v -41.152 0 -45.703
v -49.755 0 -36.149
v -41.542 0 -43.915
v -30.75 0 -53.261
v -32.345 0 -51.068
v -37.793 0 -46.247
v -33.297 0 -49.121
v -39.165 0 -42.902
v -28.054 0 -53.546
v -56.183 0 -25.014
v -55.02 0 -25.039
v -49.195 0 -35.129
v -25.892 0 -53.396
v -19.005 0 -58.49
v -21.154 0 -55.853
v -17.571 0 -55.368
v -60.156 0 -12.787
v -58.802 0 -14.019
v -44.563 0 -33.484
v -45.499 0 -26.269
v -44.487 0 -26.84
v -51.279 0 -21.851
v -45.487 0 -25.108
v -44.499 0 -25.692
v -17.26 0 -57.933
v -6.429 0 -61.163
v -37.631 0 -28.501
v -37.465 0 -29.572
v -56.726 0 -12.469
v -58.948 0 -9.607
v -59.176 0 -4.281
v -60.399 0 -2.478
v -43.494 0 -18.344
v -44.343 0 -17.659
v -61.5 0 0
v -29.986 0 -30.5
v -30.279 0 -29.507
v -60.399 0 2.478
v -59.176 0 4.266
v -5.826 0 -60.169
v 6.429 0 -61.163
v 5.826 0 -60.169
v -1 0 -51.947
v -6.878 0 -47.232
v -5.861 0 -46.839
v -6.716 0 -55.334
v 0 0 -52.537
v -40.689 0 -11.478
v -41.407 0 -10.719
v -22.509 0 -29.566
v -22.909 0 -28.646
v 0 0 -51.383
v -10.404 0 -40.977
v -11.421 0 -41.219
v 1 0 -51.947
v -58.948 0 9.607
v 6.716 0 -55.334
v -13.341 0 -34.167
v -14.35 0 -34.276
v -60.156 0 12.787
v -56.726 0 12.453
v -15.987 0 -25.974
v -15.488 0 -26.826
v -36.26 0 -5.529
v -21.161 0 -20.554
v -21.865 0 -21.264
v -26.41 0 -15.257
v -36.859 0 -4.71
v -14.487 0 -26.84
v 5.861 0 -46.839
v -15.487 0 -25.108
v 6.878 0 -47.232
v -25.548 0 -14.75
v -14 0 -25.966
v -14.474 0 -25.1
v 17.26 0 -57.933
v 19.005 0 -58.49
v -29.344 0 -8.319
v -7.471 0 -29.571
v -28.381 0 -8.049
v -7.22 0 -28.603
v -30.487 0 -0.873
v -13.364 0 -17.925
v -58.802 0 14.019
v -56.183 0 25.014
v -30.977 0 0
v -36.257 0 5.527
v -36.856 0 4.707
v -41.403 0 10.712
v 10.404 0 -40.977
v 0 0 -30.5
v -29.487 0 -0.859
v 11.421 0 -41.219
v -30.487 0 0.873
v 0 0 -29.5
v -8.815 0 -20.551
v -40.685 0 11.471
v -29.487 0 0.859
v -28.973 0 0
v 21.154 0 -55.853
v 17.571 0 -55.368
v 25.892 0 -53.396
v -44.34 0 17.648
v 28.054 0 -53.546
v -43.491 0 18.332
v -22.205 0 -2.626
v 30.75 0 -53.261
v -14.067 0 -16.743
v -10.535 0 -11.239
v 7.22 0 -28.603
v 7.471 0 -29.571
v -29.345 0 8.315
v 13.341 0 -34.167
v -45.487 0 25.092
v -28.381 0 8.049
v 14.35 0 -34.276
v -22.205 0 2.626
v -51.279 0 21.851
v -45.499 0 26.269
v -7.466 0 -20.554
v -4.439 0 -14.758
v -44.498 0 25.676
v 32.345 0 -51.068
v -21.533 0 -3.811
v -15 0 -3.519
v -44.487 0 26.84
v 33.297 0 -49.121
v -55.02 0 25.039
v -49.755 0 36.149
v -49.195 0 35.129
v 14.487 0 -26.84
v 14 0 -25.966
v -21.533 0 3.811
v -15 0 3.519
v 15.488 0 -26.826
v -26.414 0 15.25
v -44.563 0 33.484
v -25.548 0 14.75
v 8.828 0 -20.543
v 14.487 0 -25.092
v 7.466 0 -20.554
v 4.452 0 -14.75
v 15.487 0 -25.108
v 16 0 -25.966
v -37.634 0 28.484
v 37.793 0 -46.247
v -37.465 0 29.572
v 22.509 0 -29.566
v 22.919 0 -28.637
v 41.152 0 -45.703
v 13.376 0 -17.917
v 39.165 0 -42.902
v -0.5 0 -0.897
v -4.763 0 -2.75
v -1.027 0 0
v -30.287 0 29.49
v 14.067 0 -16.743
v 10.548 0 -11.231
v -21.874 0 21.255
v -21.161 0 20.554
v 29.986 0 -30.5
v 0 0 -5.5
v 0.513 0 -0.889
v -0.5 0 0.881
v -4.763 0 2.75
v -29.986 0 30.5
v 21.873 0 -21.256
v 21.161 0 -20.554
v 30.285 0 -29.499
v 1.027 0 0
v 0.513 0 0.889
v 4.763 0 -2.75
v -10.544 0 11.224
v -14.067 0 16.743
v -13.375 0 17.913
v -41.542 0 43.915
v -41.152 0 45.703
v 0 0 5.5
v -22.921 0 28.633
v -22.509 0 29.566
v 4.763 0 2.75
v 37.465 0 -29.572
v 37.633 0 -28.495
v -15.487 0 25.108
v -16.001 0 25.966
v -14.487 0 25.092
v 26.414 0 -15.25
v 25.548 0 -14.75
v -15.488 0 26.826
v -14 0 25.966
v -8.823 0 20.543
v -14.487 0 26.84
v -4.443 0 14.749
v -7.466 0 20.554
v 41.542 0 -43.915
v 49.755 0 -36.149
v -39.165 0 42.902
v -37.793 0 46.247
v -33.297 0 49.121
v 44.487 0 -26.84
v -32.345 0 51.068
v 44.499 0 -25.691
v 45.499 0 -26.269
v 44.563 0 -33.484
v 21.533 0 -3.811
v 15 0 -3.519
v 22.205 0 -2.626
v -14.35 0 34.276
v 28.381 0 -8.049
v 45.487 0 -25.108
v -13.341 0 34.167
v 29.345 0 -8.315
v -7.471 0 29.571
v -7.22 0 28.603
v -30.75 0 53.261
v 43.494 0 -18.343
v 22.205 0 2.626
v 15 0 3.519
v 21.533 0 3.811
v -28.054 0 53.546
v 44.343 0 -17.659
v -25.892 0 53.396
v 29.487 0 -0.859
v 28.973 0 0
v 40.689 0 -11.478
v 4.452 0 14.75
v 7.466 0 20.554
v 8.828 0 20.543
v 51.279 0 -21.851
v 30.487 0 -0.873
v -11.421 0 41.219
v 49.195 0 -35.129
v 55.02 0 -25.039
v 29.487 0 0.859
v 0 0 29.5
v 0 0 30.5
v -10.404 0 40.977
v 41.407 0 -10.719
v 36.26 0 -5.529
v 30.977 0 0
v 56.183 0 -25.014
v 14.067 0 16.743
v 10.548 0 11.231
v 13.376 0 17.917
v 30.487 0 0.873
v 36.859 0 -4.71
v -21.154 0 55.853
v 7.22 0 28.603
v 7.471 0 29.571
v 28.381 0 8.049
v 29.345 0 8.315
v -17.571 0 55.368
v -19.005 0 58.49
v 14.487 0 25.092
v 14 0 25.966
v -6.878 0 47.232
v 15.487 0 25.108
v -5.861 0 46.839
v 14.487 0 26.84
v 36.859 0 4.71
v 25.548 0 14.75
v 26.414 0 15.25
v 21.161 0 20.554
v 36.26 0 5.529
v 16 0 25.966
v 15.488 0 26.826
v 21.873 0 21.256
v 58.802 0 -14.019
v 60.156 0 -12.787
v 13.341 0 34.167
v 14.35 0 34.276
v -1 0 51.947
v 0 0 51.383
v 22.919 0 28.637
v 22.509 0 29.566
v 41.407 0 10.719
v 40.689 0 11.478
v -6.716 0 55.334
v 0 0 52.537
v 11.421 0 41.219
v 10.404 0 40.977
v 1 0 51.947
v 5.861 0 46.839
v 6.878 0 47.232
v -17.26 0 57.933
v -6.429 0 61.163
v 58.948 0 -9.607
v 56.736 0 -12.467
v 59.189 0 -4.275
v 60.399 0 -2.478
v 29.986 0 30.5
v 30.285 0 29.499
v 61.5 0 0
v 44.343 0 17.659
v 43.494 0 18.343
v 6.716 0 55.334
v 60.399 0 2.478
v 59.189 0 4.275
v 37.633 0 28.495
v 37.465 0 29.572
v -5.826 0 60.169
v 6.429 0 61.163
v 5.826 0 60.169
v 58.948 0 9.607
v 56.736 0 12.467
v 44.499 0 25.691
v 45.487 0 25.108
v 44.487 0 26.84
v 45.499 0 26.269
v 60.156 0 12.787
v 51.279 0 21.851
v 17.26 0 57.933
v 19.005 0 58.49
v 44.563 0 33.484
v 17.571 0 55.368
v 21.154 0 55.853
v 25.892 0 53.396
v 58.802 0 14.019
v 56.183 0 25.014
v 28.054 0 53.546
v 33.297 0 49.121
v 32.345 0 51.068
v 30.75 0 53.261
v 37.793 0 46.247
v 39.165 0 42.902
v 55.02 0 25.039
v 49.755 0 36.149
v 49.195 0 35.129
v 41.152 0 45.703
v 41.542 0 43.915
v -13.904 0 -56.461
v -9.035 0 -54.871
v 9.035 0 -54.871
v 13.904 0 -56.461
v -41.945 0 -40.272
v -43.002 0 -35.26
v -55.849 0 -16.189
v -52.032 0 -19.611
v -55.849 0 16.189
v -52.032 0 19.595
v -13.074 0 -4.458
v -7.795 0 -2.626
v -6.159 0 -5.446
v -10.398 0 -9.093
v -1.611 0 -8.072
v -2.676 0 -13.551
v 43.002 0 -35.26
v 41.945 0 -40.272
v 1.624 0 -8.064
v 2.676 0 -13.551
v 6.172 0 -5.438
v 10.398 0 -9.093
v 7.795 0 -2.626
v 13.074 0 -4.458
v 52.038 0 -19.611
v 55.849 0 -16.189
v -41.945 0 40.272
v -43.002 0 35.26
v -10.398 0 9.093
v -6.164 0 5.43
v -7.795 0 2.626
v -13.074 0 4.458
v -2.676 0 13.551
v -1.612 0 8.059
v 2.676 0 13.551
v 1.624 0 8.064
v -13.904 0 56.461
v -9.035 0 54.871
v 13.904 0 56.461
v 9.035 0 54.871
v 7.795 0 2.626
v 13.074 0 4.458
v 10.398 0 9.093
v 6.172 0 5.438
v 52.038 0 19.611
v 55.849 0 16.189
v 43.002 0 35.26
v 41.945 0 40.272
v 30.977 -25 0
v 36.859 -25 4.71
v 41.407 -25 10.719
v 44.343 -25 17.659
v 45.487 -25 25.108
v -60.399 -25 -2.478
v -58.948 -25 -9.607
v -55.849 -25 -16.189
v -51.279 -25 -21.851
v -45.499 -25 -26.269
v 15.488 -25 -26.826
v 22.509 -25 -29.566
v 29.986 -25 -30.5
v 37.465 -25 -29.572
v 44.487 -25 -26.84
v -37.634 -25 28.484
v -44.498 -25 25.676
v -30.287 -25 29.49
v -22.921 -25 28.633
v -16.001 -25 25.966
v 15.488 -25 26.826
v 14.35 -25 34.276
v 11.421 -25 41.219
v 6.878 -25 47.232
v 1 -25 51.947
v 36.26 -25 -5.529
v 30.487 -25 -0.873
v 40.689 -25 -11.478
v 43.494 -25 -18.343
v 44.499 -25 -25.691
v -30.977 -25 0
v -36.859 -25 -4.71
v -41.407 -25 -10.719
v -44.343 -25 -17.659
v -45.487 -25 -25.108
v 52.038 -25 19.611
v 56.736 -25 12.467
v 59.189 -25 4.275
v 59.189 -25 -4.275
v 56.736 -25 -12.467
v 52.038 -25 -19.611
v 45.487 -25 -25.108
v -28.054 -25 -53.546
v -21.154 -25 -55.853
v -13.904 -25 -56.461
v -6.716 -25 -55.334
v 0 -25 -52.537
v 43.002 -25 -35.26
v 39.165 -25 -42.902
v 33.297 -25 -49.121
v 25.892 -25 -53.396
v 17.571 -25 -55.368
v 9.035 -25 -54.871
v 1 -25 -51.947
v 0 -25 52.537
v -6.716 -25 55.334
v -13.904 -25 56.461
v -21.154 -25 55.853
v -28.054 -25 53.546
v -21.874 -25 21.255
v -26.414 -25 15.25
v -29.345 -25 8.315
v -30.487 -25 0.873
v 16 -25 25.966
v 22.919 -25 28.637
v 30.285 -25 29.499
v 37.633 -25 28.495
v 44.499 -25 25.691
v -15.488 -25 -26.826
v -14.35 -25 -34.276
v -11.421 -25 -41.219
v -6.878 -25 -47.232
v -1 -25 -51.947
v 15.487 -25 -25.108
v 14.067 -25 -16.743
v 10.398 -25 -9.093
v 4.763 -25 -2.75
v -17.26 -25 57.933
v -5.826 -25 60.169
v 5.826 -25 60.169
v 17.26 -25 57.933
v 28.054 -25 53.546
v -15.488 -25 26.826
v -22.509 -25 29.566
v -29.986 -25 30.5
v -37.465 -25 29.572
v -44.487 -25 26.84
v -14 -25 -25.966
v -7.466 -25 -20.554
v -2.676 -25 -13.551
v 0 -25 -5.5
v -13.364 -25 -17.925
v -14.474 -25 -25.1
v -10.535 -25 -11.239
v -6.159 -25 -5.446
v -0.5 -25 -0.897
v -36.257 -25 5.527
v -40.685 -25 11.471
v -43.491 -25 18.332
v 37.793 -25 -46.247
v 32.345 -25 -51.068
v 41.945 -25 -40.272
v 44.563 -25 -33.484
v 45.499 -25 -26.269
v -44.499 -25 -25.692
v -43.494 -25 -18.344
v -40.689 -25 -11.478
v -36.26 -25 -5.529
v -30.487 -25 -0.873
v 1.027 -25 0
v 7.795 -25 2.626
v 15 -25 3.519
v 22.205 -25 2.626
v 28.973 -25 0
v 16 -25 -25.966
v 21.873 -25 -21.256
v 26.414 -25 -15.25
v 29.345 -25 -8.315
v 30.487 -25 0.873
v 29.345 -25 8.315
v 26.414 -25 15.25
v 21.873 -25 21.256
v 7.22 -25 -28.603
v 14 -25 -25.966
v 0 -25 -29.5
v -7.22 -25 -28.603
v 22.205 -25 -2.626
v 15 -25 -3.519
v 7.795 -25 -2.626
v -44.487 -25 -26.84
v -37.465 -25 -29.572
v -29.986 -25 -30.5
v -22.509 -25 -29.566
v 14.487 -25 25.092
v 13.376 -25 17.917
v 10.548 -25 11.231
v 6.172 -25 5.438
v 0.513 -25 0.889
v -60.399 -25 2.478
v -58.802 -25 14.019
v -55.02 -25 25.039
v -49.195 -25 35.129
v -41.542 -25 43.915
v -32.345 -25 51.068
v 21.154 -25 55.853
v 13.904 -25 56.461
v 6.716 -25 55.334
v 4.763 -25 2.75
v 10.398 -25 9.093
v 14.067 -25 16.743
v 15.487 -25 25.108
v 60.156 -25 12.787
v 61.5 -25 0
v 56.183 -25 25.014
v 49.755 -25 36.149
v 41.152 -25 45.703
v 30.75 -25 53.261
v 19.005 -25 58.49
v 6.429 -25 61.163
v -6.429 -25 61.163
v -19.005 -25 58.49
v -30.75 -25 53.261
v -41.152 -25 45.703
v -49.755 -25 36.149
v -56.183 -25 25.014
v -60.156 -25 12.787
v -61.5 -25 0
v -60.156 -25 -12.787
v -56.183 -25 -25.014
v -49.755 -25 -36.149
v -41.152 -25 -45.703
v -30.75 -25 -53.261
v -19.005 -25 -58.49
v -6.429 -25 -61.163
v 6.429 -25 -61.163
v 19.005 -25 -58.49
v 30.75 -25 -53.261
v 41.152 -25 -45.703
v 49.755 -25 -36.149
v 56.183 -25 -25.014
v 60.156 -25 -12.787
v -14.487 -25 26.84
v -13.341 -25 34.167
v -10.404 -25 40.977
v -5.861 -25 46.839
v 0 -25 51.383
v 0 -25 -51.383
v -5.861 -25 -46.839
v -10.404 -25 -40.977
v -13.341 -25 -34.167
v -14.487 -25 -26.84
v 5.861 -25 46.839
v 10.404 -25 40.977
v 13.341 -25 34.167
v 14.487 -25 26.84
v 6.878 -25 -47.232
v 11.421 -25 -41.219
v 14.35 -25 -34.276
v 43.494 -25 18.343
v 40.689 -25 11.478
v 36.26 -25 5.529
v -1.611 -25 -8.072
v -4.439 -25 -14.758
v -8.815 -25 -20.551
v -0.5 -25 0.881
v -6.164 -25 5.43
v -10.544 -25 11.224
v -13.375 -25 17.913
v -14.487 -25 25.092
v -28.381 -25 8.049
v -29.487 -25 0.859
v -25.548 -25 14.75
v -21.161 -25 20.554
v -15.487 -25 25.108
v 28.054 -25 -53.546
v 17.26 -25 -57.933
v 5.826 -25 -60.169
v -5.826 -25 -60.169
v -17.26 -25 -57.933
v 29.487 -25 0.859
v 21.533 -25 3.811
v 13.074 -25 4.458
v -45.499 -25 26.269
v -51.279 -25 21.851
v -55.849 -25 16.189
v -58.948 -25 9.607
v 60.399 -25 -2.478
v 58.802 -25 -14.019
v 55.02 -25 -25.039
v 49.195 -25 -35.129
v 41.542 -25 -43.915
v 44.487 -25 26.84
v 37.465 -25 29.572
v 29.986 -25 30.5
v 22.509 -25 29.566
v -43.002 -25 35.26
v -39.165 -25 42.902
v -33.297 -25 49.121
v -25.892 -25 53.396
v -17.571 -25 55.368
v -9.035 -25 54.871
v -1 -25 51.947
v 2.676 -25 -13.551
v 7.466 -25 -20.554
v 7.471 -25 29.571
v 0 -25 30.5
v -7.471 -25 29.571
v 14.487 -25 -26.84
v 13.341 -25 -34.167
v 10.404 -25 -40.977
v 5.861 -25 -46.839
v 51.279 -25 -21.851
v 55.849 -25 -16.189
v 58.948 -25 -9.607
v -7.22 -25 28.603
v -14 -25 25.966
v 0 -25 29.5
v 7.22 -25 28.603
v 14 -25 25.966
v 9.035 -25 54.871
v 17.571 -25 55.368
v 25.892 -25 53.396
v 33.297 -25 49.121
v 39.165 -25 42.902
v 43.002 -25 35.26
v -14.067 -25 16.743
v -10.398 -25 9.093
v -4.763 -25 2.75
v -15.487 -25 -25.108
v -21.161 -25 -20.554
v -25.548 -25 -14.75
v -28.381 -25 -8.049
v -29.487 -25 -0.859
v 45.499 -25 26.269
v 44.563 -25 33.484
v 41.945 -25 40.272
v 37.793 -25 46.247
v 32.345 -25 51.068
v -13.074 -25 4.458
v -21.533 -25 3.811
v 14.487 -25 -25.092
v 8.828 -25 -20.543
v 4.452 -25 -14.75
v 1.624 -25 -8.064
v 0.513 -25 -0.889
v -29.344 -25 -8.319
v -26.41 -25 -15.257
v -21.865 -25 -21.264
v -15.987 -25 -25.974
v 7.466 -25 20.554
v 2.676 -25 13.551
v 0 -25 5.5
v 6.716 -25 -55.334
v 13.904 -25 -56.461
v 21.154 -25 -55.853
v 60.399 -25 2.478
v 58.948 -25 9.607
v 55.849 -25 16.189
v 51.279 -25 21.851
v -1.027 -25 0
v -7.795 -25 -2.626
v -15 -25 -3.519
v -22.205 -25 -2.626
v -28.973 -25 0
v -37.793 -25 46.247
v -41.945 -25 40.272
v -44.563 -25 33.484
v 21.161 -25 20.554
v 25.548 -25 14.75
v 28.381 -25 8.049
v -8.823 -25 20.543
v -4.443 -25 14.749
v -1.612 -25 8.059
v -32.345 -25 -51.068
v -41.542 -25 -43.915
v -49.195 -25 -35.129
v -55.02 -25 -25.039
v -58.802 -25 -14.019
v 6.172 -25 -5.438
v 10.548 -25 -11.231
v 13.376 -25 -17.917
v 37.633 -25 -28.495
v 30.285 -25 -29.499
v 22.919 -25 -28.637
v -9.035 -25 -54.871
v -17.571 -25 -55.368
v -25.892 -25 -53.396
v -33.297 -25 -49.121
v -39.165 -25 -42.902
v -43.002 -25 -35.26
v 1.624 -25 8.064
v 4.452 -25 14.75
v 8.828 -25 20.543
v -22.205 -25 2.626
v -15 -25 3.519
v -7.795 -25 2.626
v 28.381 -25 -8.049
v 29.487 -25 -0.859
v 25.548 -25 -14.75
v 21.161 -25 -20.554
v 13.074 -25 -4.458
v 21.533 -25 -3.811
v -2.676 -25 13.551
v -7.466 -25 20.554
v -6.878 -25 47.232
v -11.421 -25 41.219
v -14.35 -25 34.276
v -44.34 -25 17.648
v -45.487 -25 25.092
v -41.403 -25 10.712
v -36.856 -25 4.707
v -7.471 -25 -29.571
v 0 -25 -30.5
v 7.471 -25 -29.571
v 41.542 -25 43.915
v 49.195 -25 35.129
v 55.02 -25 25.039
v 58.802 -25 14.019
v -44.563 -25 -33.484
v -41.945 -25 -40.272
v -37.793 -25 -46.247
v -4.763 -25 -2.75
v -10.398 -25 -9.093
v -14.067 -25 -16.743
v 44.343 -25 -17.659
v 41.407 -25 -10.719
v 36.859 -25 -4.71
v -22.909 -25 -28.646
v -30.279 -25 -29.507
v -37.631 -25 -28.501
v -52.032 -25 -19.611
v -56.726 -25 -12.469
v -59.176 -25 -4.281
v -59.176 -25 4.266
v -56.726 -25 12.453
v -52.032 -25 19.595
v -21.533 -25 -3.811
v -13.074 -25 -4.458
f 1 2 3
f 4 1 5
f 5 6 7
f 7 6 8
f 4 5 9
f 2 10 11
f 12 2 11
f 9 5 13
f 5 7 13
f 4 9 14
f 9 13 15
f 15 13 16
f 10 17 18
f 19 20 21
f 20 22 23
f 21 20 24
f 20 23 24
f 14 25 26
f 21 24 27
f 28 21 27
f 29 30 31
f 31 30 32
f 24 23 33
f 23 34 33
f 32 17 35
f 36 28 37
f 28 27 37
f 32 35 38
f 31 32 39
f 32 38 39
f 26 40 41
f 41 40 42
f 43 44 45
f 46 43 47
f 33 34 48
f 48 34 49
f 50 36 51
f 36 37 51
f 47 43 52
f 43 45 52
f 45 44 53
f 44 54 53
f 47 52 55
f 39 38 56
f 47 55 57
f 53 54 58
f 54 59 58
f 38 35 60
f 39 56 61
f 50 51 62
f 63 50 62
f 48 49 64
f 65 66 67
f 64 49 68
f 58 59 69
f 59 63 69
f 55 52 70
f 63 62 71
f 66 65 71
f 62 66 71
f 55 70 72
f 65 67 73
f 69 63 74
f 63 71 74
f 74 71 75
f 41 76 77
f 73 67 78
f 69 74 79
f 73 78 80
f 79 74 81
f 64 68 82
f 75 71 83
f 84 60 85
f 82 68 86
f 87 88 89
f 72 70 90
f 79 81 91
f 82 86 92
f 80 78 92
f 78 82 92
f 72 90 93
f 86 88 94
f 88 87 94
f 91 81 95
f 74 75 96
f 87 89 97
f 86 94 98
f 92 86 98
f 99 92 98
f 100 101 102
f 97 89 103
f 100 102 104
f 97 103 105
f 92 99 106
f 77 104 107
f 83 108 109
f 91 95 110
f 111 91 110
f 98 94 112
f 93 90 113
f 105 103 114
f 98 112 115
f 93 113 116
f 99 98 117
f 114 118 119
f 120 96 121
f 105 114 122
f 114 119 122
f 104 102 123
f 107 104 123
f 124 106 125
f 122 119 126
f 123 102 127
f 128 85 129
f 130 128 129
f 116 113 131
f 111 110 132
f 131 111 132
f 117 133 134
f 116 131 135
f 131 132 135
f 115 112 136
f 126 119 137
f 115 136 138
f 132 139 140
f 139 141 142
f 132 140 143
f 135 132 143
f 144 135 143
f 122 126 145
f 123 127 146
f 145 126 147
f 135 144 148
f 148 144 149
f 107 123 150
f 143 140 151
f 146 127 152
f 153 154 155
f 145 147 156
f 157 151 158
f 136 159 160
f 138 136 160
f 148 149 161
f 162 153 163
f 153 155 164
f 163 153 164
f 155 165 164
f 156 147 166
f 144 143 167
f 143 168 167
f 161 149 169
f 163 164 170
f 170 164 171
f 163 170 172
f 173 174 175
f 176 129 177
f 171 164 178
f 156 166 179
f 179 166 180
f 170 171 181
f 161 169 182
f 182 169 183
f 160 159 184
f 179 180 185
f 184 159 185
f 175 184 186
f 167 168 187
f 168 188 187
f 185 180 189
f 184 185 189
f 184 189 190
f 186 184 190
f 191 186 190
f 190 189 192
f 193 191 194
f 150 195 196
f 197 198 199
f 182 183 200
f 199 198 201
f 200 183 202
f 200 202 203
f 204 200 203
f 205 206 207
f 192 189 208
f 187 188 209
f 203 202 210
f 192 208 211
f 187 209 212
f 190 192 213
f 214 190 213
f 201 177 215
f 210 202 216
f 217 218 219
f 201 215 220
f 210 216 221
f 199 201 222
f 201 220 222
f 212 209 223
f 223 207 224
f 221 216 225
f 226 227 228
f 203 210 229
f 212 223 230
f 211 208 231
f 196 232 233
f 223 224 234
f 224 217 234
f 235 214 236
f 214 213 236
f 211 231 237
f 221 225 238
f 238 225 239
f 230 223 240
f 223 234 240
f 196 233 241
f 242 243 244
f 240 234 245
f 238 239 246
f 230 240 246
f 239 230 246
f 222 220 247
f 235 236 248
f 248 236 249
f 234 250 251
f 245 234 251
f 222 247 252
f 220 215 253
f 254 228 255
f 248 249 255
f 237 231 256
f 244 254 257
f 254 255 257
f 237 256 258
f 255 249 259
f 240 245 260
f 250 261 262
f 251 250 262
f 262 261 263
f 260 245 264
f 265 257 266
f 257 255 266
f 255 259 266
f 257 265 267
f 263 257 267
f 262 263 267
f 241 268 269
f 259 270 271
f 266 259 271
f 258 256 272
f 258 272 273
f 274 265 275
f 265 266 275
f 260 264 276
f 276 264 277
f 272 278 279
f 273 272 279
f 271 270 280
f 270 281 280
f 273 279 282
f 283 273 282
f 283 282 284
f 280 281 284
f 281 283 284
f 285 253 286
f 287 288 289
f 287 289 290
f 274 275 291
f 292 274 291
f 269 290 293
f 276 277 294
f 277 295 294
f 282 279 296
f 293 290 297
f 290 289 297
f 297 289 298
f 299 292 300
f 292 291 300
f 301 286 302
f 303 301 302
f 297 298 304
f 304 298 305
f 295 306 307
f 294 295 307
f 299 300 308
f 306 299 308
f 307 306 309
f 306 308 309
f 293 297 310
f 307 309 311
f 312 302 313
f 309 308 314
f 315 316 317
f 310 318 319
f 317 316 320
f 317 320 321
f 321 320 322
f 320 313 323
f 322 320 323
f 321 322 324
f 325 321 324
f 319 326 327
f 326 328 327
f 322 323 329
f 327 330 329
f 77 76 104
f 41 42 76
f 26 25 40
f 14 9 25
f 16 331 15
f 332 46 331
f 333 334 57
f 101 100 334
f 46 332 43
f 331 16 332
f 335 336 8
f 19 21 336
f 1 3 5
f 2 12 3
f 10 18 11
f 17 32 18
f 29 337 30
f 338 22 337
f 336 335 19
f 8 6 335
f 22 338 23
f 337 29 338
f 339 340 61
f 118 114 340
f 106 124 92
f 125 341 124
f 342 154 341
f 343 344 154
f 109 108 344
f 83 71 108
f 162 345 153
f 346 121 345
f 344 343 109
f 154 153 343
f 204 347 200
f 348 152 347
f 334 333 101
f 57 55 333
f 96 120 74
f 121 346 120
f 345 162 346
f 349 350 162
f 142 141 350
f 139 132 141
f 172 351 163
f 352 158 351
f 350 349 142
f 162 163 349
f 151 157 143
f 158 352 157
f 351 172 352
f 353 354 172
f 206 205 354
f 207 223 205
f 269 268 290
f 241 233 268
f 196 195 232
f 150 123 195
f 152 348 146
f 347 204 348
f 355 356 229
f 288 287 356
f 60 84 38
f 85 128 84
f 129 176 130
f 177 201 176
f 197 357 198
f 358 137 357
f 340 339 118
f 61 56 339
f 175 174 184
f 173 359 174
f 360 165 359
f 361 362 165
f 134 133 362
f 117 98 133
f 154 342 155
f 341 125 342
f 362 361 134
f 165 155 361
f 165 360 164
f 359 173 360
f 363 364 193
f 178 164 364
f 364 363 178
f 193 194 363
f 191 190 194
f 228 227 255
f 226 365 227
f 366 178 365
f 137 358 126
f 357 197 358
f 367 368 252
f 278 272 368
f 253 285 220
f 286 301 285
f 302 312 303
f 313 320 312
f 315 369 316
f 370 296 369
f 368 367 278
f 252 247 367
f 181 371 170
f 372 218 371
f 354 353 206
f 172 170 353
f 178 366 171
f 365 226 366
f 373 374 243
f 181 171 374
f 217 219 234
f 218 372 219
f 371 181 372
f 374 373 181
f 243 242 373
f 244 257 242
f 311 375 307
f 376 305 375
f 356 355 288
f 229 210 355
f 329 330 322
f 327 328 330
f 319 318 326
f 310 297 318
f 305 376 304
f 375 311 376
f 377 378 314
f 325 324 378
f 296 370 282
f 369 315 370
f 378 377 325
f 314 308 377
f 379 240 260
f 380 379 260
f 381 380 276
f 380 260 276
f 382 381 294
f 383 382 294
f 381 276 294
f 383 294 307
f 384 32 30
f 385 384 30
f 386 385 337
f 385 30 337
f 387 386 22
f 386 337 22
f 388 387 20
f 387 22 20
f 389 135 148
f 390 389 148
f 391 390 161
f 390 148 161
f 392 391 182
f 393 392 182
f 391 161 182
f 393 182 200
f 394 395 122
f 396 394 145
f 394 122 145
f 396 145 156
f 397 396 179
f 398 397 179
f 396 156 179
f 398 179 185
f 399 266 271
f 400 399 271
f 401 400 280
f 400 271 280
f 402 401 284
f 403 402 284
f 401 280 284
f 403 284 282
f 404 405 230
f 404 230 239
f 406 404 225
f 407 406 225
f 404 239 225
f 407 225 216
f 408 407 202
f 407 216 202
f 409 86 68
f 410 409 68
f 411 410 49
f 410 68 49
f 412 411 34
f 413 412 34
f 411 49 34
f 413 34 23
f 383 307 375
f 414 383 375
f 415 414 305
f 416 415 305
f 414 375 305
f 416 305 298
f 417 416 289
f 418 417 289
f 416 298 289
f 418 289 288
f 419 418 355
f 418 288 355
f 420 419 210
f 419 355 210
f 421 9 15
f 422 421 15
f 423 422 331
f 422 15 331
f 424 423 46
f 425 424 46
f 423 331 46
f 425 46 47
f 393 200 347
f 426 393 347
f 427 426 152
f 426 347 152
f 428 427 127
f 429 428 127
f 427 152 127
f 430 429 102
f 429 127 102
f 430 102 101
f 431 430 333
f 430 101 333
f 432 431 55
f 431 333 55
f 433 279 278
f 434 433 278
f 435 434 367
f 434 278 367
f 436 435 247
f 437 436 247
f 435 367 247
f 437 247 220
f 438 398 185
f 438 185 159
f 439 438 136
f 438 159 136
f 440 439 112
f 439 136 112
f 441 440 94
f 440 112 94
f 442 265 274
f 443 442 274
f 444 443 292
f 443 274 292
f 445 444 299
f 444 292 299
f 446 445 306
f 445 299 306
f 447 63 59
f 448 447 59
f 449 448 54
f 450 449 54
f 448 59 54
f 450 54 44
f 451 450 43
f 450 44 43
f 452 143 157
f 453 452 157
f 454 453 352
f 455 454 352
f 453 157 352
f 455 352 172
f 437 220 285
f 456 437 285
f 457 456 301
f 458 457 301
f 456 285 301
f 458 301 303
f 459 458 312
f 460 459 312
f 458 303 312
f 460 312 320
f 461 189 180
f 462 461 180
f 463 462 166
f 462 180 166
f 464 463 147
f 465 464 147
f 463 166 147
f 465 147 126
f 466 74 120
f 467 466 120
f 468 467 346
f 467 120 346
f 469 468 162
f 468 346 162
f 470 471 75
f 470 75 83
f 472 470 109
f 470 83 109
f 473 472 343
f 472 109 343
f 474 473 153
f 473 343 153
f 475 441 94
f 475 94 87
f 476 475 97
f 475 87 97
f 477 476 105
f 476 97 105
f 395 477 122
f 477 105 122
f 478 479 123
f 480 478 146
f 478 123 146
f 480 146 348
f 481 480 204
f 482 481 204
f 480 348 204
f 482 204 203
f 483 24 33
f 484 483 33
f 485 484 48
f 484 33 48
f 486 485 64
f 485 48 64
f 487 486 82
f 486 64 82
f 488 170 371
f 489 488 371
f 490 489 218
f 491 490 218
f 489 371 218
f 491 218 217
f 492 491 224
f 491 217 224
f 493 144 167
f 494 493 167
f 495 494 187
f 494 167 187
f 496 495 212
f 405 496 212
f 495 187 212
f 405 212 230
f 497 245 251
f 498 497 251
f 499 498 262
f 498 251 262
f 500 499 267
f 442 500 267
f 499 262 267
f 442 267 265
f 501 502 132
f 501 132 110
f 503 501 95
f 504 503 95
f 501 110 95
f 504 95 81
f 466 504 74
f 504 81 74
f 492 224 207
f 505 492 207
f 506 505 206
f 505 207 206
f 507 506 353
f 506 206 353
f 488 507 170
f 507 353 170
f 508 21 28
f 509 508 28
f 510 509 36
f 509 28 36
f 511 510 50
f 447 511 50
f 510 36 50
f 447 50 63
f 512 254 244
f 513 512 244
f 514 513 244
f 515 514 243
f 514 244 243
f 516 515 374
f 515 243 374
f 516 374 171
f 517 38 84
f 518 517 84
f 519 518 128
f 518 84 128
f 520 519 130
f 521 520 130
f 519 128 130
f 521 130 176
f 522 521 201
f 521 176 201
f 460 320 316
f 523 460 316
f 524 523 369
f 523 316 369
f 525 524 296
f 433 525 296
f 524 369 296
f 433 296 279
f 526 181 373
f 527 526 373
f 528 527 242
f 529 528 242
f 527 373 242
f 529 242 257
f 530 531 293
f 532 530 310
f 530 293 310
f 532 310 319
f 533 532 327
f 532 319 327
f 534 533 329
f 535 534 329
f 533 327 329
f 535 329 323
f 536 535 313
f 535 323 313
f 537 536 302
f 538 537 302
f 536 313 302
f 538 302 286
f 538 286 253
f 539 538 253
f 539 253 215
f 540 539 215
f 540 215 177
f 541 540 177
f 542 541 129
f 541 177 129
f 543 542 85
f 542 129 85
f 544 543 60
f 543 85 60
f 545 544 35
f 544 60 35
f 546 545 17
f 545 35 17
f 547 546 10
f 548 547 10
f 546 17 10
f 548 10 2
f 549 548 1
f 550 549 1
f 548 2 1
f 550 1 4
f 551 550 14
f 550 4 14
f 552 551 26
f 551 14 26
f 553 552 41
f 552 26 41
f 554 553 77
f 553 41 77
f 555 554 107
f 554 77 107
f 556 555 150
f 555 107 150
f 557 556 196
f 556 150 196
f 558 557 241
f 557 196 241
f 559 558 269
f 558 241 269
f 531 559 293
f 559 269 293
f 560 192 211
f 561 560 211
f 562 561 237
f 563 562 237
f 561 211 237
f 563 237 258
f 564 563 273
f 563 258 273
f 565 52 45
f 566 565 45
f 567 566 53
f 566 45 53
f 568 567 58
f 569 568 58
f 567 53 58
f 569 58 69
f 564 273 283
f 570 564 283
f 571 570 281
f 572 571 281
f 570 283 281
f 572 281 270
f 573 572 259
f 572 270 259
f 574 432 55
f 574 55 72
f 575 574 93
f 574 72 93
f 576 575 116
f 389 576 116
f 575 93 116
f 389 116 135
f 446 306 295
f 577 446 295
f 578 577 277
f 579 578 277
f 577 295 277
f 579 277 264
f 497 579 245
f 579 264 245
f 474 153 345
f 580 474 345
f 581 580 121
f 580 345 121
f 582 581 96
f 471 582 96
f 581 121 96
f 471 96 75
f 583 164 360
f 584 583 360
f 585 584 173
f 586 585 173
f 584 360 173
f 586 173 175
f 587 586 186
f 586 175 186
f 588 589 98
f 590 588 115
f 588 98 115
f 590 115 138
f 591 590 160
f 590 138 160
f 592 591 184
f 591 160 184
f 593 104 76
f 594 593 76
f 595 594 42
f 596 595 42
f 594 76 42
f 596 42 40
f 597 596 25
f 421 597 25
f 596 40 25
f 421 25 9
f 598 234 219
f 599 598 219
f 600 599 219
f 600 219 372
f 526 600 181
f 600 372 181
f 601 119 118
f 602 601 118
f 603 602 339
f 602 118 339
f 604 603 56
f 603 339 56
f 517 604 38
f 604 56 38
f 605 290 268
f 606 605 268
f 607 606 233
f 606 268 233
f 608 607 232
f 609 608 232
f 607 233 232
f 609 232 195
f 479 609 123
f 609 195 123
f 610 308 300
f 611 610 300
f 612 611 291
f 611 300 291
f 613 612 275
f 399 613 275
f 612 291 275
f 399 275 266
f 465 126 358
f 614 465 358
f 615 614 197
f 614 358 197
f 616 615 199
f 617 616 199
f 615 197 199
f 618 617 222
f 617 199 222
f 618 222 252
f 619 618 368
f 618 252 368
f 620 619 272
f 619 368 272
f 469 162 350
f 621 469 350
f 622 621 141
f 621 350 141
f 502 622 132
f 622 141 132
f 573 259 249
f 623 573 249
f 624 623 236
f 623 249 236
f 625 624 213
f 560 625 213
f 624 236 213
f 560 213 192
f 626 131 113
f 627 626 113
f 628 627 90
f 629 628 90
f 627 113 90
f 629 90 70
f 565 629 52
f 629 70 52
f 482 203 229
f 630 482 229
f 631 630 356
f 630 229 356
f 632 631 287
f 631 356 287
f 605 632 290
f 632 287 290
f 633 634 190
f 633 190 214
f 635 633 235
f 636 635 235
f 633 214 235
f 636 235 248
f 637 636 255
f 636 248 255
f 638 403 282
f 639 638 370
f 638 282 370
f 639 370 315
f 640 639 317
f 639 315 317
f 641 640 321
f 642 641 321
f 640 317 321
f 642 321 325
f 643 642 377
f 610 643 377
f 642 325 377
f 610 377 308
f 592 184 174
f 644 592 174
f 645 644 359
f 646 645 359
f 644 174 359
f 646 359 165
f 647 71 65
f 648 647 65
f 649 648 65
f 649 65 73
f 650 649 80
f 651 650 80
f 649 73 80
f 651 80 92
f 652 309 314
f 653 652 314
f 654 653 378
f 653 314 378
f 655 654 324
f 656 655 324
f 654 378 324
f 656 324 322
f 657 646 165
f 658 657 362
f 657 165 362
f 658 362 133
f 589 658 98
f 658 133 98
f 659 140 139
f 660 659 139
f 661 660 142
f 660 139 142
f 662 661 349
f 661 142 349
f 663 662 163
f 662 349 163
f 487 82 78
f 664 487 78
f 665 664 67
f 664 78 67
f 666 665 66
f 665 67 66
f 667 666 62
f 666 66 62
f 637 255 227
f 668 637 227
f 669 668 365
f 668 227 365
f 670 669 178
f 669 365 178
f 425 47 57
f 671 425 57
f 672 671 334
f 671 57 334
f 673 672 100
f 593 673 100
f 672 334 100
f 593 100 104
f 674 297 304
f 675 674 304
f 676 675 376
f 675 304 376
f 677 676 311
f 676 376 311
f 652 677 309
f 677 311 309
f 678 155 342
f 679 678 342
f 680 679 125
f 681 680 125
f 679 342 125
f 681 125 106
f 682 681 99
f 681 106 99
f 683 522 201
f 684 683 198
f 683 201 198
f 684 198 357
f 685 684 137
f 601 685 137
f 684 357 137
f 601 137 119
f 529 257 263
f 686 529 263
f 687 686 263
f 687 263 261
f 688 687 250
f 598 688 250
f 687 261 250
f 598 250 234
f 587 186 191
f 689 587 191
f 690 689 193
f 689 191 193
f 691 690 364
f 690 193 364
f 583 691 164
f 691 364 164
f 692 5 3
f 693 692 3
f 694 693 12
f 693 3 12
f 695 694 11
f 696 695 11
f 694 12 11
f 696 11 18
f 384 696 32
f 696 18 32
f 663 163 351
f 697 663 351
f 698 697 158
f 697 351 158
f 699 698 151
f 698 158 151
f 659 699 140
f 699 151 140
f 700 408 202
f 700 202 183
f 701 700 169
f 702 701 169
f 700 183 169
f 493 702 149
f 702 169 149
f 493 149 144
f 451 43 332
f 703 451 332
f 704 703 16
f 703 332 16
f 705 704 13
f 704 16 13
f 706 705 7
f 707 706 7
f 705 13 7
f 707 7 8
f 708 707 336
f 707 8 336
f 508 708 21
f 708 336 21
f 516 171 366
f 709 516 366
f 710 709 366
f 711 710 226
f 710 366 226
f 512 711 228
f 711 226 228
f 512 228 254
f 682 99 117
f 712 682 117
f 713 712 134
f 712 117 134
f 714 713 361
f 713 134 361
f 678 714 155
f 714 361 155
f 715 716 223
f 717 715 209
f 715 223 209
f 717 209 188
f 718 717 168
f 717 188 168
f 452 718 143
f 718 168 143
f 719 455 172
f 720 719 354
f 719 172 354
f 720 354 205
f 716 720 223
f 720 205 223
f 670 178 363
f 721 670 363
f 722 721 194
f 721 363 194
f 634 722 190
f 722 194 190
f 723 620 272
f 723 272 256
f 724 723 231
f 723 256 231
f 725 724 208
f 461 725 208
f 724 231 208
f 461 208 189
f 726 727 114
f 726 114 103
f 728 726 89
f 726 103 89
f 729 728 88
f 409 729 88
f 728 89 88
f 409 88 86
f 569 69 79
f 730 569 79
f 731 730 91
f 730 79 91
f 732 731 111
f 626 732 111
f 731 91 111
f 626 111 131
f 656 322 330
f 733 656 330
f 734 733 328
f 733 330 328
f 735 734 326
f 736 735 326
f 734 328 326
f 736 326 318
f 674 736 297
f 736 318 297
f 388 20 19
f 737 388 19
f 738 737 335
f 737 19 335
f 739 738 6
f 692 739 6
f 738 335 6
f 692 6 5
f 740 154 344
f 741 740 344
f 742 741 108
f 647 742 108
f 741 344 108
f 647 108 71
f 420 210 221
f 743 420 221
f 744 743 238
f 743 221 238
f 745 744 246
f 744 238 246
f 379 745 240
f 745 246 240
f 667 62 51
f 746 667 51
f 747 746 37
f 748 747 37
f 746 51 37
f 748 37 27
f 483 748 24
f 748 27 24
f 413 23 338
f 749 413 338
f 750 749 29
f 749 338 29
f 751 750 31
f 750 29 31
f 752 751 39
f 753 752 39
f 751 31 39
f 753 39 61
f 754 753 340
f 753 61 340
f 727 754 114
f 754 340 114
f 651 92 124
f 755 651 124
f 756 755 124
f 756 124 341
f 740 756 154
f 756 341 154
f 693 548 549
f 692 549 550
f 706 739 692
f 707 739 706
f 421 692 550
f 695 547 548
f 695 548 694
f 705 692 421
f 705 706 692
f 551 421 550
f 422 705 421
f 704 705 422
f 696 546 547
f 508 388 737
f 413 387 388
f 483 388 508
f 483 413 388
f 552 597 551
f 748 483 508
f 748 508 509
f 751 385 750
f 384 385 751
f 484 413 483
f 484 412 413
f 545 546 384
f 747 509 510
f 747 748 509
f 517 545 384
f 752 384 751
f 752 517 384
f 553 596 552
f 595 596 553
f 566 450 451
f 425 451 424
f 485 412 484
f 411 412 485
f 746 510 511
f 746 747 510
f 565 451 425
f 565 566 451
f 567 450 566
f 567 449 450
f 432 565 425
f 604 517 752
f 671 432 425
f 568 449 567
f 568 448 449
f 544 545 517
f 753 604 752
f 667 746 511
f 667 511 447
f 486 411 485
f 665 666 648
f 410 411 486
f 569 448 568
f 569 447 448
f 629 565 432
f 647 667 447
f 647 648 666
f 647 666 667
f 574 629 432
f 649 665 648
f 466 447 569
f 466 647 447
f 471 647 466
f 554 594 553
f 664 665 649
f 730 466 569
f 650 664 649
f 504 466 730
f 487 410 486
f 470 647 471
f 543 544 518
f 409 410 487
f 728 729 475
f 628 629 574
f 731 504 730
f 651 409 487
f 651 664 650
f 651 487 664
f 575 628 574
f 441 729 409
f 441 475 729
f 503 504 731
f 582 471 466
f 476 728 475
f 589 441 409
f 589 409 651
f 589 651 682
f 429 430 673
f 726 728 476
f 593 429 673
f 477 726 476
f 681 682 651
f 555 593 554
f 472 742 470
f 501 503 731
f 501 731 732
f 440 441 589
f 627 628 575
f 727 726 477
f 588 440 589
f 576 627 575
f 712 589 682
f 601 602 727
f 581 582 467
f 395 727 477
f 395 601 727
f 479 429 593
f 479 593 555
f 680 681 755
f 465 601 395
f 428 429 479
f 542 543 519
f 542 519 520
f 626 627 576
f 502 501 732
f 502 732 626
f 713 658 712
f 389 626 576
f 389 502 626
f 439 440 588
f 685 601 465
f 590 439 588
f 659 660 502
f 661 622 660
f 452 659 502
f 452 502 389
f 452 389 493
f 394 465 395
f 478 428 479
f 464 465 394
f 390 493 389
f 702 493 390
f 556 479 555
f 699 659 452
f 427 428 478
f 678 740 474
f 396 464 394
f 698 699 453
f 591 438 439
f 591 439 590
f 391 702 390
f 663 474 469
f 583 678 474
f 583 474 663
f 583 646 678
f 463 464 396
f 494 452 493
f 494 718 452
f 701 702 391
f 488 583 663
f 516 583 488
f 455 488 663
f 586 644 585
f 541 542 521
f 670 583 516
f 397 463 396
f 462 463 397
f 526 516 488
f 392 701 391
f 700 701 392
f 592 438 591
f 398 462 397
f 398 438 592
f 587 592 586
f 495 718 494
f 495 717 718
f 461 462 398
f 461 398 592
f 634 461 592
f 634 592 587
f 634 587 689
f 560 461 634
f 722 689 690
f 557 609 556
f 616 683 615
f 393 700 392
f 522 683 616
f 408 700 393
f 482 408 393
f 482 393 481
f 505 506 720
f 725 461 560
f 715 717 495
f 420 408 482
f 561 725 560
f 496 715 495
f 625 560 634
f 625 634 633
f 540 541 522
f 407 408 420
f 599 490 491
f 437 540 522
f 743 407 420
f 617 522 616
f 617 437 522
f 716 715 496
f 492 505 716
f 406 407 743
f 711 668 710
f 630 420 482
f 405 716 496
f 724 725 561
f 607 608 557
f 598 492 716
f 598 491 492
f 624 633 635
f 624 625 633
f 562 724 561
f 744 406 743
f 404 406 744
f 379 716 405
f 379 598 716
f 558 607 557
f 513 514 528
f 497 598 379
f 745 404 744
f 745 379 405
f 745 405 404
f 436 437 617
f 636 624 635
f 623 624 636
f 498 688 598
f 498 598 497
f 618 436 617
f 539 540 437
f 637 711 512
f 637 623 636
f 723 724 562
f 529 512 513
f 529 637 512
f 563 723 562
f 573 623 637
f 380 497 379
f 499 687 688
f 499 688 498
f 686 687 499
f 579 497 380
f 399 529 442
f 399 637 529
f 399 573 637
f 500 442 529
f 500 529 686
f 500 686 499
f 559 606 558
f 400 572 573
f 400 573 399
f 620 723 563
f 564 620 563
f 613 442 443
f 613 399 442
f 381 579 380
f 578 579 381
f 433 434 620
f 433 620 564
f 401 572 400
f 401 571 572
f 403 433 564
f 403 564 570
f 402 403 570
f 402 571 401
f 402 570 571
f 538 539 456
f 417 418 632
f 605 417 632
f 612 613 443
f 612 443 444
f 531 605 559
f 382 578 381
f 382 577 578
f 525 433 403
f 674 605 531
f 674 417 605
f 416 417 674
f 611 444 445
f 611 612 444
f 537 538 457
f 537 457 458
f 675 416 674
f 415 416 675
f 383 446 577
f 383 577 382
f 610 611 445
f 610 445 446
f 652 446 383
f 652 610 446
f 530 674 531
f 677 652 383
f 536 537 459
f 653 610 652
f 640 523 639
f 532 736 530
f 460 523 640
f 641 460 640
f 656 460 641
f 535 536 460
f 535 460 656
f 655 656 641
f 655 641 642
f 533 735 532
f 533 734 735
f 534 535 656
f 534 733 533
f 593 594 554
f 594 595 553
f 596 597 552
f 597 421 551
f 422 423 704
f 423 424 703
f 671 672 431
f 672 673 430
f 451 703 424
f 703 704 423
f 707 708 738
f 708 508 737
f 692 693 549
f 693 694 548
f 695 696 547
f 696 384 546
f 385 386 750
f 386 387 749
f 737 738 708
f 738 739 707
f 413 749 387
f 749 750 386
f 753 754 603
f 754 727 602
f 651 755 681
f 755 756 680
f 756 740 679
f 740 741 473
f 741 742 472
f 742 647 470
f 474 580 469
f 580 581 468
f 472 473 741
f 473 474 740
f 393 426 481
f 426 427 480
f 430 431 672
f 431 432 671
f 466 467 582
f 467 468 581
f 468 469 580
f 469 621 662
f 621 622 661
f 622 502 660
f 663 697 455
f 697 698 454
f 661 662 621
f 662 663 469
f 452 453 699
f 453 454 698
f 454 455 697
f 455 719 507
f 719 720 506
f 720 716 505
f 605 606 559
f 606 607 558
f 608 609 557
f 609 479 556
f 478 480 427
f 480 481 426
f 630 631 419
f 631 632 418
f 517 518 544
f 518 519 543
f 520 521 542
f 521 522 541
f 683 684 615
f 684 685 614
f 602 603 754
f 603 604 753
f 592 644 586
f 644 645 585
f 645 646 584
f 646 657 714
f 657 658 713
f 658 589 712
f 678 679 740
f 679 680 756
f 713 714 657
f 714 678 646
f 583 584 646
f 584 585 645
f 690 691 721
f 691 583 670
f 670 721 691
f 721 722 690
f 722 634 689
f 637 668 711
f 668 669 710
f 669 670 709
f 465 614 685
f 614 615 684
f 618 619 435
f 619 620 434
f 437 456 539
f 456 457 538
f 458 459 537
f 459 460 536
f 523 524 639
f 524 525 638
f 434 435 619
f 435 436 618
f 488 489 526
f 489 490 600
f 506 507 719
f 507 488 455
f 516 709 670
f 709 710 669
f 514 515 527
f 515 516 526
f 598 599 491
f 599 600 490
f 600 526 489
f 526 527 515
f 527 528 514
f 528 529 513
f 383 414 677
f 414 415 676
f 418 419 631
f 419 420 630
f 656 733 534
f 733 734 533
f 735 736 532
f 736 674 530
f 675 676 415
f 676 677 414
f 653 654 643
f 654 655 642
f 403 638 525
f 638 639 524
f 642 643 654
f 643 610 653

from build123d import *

# Parameters (mm, degrees)
F0_R     = 61.5
F1_DEPTH = 25


with BuildPart() as f1:
    # F0 (on Front) → F1 (new body)
    with BuildSketch(Plane.XZ):
        Circle(F0_R)
        with BuildLine():
            ThreePointArc((-28.054004, -53.546012), (-13.904054, -56.461066), (0, -52.537306))
            ThreePointArc((0, -52.537306), (13.904054, -56.461066), (28.054004, -53.546012))
            ThreePointArc((28.054004, -53.546012), (0, -60.45), (-28.054004, -53.546012))
        make_face(mode=Mode.SUBTRACT)
        with BuildLine():
            ThreePointArc((-44.487497, -26.839569), (-29.986229, -30.499997), (-15.488273, -26.826475))
            ThreePointArc((-15.488273, -26.826475), (-11.420658, -41.218834), (-1, -51.947086))
            ThreePointArc((-1, -51.947086), (-29.75, -51.528512), (-44.487497, -26.839569))
        make_face(mode=Mode.SUBTRACT)
        with BuildLine():
            ThreePointArc((0, -51.382534), (-10.404205, -40.976641), (-14.487497, -26.839569))
            ThreePointArc((-14.487497, -26.839569), (0, -30.5), (14.487497, -26.839569))
            ThreePointArc((14.487497, -26.839569), (10.404205, -40.976641), (0, -51.382534))
        make_face(mode=Mode.SUBTRACT)
        with BuildLine():
            ThreePointArc((-60.399208, -2.477526), (-55.848744, -16.189269), (-45.498641, -26.268653))
            ThreePointArc((-45.498641, -26.268653), (-41.94469, -40.271797), (-32.345204, -51.068486))
            ThreePointArc((-32.345204, -51.068486), (-52.351236, -30.225), (-60.399208, -2.477526))
        make_face(mode=Mode.SUBTRACT)
        with BuildLine():
            ThreePointArc((-45.487042, 25.091798), (-41.402951, 10.71203), (-30.976545, 0))
            ThreePointArc((-30.976545, 0), (-41.406887, -10.718838), (-45.487497, -25.107518))
            ThreePointArc((-45.487497, -25.107518), (-59.487041, -0.007733), (-45.487042, 25.091798))
        make_face(mode=Mode.SUBTRACT)
        with BuildLine():
            ThreePointArc((-44.498586, -25.691944), (-40.689081, -11.47831), (-30.487497, -0.873244))
            ThreePointArc((-30.487497, -0.873244), (-26.409976, -15.256598), (-15.987047, -25.974321))
            ThreePointArc((-15.987047, -25.974321), (-30.279198, -29.50655), (-44.498586, -25.691944))
        make_face(mode=Mode.SUBTRACT)
        with BuildLine():
            ThreePointArc((-29.487497, -0.858807), (-17.326184, -4.430401), (-4.76314, -2.75))
            ThreePointArc((-4.76314, -2.75), (-12.499932, -12.789714), (-15.487497, -25.107518))
            ThreePointArc((-15.487497, -25.107518), (-25.547749, -14.75), (-29.487497, -0.858807))
        make_face(mode=Mode.SUBTRACT)
        with BuildLine():
            ThreePointArc((-14.473642, -25.099514), (-10.534797, -11.238761), (-0.500455, -0.897245))
            ThreePointArc((-0.500455, -0.897245), (-4.439299, -14.757998), (-14.473642, -25.099514))
        make_face(mode=Mode.SUBTRACT)
        with BuildLine():
            ThreePointArc((1, -51.947086), (11.420658, -41.218834), (15.488273, -26.826475))
            ThreePointArc((15.488273, -26.826475), (29.986229, -30.499997), (44.487497, -26.839569))
            ThreePointArc((44.487497, -26.839569), (29.75, -51.528512), (1, -51.947086))
        make_face(mode=Mode.SUBTRACT)
        with BuildLine():
            ThreePointArc((-14, -25.966324), (-4.826252, -17.220116), (0, -5.5))
            ThreePointArc((0, -5.5), (4.826252, -17.220116), (14, -25.966324))
            ThreePointArc((14, -25.966324), (0, -29.5), (-14, -25.966324))
        make_face(mode=Mode.SUBTRACT)
        with BuildLine():
            ThreePointArc((14.486594, -25.091517), (4.452251, -14.75), (0.513406, -0.889245))
            ThreePointArc((0.513406, -0.889245), (10.547749, -11.230762), (14.486594, -25.091517))
        make_face(mode=Mode.SUBTRACT)
        with BuildLine():
            ThreePointArc((28.973189, 0), (15, -3.519238), (1.026811, 0))
            ThreePointArc((1.026811, 0), (15, 3.519238), (28.973189, 0))
        make_face(mode=Mode.SUBTRACT)
        with BuildLine():
            ThreePointArc((15.487497, -25.107518), (12.499932, -12.789714), (4.76314, -2.75))
            ThreePointArc((4.76314, -2.75), (17.326184, -4.430401), (29.487497, -0.858807))
            ThreePointArc((29.487497, -0.858807), (25.547749, -14.75), (15.487497, -25.107518))
        make_face(mode=Mode.SUBTRACT)
        with BuildLine():
            ThreePointArc((44.498579, -25.691267), (30.28471, -29.498626), (16, -25.966324))
            ThreePointArc((16, -25.966324), (26.413775, -15.25), (30.487497, -0.873244))
            ThreePointArc((30.487497, -0.873244), (40.688914, -11.478015), (44.498579, -25.691267))
        make_face(mode=Mode.SUBTRACT)
        with BuildLine():
            ThreePointArc((32.345204, -51.068486), (41.94469, -40.271797), (45.498641, -26.268653))
            ThreePointArc((45.498641, -26.268653), (55.848744, -16.189269), (60.399208, -2.477526))
            ThreePointArc((60.399208, -2.477526), (52.351236, -30.225), (32.345204, -51.068486))
        make_face(mode=Mode.SUBTRACT)
        with BuildLine():
            ThreePointArc((-32.345204, 51.068486), (-41.94469, 40.271797), (-45.498641, 26.268653))
            ThreePointArc((-45.498641, 26.268653), (-55.848744, 16.189269), (-60.399208, 2.477526))
            ThreePointArc((-60.399208, 2.477526), (-52.351236, 30.225), (-32.345204, 51.068486))
        make_face(mode=Mode.SUBTRACT)
        with BuildLine():
            ThreePointArc((-44.498426, 25.676034), (-30.286966, 29.490471), (-16.000887, 25.965778))
            ThreePointArc((-16.000887, 25.965778), (-26.414035, 15.249549), (-30.487497, 0.873244))
            ThreePointArc((-30.487497, 0.873244), (-40.685169, 11.471382), (-44.498426, 25.676034))
        make_face(mode=Mode.SUBTRACT)
        with BuildLine():
            ThreePointArc((-15.487497, 25.107518), (-12.499932, 12.789714), (-4.76314, 2.75))
            ThreePointArc((-4.76314, 2.75), (-17.326184, 4.430401), (-29.487497, 0.858807))
            ThreePointArc((-29.487497, 0.858807), (-25.547749, 14.75), (-15.487497, 25.107518))
        make_face(mode=Mode.SUBTRACT)
        with BuildLine():
            ThreePointArc((-28.973189, 0), (-15, 3.519238), (-1.026811, 0))
            ThreePointArc((-1.026811, 0), (-15, -3.519238), (-28.973189, 0))
        make_face(mode=Mode.SUBTRACT)
        with BuildLine():
            ThreePointArc((-14.486594, 25.091517), (-4.443107, 14.74859), (-0.500455, 0.881244))
            ThreePointArc((-0.500455, 0.881244), (-10.543942, 11.224172), (-14.486594, 25.091517))
        make_face(mode=Mode.SUBTRACT)
        with BuildLine():
            ThreePointArc((-1, 51.947086), (-11.420658, 41.218834), (-15.488273, 26.826475))
            ThreePointArc((-15.488273, 26.826475), (-29.986229, 30.499997), (-44.487497, 26.839569))
            ThreePointArc((-44.487497, 26.839569), (-29.75, 51.528512), (-1, 51.947086))
        make_face(mode=Mode.SUBTRACT)
        with BuildLine():
            ThreePointArc((-2e-06, 51.382535), (10.404204, 40.976642), (14.487497, 26.839569))
            ThreePointArc((14.487497, 26.839569), (0, 30.5), (-14.487497, 26.839569))
            ThreePointArc((-14.487497, 26.839569), (-10.404206, 40.976641), (-2e-06, 51.382535))
        make_face(mode=Mode.SUBTRACT)
        with BuildLine():
            ThreePointArc((14.486594, 25.091517), (10.547749, 11.230762), (0.513406, 0.889245))
            ThreePointArc((0.513406, 0.889245), (4.452251, 14.75), (14.486594, 25.091517))
        make_face(mode=Mode.SUBTRACT)
        with BuildLine():
            ThreePointArc((29.487497, 0.858807), (17.326184, 4.430401), (4.76314, 2.75))
            ThreePointArc((4.76314, 2.75), (12.499932, 12.789714), (15.487497, 25.107518))
            ThreePointArc((15.487497, 25.107518), (25.547749, 14.75), (29.487497, 0.858807))
        make_face(mode=Mode.SUBTRACT)
        with BuildLine():
            ThreePointArc((44.498579, 25.691267), (40.688914, 11.478016), (30.487496, 0.873246))
            ThreePointArc((30.487496, 0.873246), (26.413774, 15.250001), (16, 25.966324))
            ThreePointArc((16, 25.966324), (30.28471, 29.498626), (44.498579, 25.691267))
        make_face(mode=Mode.SUBTRACT)
        with BuildLine():
            ThreePointArc((-14, 25.966324), (0, 29.5), (14, 25.966324))
            ThreePointArc((14, 25.966324), (4.826252, 17.220116), (0, 5.5))
            ThreePointArc((0, 5.5), (-4.826252, 17.220116), (-14, 25.966324))
        make_face(mode=Mode.SUBTRACT)
        with BuildLine():
            ThreePointArc((45.487497, -25.107518), (41.406887, -10.718838), (30.976545, 0))
            ThreePointArc((30.976545, 0), (41.406887, 10.718838), (45.487497, 25.107518))
            ThreePointArc((45.487497, 25.107518), (59.5, 0), (45.487497, -25.107518))
        make_face(mode=Mode.SUBTRACT)
        with BuildLine():
            ThreePointArc((60.399208, 2.477526), (55.848744, 16.189269), (45.498641, 26.268653))
            ThreePointArc((45.498641, 26.268653), (41.94469, 40.271797), (32.345204, 51.068486))
            ThreePointArc((32.345204, 51.068486), (52.351236, 30.225), (60.399208, 2.477526))
        make_face(mode=Mode.SUBTRACT)
        with BuildLine():
            ThreePointArc((44.487497, 26.839569), (29.986229, 30.499997), (15.488273, 26.826475))
            ThreePointArc((15.488273, 26.826475), (11.420657, 41.218835), (0.999998, 51.947088))
            ThreePointArc((0.999998, 51.947088), (29.75, 51.528514), (44.487497, 26.839569))
        make_face(mode=Mode.SUBTRACT)
        with BuildLine():
            ThreePointArc((28.054004, 53.546012), (13.904054, 56.461066), (0, 52.537306))
            ThreePointArc((0, 52.537306), (-13.904054, 56.461066), (-28.054004, 53.546012))
            ThreePointArc((-28.054004, 53.546012), (0, 60.45), (28.054004, 53.546012))
        make_face(mode=Mode.SUBTRACT)
    extrude(amount=F1_DEPTH)


solid = f1.part
